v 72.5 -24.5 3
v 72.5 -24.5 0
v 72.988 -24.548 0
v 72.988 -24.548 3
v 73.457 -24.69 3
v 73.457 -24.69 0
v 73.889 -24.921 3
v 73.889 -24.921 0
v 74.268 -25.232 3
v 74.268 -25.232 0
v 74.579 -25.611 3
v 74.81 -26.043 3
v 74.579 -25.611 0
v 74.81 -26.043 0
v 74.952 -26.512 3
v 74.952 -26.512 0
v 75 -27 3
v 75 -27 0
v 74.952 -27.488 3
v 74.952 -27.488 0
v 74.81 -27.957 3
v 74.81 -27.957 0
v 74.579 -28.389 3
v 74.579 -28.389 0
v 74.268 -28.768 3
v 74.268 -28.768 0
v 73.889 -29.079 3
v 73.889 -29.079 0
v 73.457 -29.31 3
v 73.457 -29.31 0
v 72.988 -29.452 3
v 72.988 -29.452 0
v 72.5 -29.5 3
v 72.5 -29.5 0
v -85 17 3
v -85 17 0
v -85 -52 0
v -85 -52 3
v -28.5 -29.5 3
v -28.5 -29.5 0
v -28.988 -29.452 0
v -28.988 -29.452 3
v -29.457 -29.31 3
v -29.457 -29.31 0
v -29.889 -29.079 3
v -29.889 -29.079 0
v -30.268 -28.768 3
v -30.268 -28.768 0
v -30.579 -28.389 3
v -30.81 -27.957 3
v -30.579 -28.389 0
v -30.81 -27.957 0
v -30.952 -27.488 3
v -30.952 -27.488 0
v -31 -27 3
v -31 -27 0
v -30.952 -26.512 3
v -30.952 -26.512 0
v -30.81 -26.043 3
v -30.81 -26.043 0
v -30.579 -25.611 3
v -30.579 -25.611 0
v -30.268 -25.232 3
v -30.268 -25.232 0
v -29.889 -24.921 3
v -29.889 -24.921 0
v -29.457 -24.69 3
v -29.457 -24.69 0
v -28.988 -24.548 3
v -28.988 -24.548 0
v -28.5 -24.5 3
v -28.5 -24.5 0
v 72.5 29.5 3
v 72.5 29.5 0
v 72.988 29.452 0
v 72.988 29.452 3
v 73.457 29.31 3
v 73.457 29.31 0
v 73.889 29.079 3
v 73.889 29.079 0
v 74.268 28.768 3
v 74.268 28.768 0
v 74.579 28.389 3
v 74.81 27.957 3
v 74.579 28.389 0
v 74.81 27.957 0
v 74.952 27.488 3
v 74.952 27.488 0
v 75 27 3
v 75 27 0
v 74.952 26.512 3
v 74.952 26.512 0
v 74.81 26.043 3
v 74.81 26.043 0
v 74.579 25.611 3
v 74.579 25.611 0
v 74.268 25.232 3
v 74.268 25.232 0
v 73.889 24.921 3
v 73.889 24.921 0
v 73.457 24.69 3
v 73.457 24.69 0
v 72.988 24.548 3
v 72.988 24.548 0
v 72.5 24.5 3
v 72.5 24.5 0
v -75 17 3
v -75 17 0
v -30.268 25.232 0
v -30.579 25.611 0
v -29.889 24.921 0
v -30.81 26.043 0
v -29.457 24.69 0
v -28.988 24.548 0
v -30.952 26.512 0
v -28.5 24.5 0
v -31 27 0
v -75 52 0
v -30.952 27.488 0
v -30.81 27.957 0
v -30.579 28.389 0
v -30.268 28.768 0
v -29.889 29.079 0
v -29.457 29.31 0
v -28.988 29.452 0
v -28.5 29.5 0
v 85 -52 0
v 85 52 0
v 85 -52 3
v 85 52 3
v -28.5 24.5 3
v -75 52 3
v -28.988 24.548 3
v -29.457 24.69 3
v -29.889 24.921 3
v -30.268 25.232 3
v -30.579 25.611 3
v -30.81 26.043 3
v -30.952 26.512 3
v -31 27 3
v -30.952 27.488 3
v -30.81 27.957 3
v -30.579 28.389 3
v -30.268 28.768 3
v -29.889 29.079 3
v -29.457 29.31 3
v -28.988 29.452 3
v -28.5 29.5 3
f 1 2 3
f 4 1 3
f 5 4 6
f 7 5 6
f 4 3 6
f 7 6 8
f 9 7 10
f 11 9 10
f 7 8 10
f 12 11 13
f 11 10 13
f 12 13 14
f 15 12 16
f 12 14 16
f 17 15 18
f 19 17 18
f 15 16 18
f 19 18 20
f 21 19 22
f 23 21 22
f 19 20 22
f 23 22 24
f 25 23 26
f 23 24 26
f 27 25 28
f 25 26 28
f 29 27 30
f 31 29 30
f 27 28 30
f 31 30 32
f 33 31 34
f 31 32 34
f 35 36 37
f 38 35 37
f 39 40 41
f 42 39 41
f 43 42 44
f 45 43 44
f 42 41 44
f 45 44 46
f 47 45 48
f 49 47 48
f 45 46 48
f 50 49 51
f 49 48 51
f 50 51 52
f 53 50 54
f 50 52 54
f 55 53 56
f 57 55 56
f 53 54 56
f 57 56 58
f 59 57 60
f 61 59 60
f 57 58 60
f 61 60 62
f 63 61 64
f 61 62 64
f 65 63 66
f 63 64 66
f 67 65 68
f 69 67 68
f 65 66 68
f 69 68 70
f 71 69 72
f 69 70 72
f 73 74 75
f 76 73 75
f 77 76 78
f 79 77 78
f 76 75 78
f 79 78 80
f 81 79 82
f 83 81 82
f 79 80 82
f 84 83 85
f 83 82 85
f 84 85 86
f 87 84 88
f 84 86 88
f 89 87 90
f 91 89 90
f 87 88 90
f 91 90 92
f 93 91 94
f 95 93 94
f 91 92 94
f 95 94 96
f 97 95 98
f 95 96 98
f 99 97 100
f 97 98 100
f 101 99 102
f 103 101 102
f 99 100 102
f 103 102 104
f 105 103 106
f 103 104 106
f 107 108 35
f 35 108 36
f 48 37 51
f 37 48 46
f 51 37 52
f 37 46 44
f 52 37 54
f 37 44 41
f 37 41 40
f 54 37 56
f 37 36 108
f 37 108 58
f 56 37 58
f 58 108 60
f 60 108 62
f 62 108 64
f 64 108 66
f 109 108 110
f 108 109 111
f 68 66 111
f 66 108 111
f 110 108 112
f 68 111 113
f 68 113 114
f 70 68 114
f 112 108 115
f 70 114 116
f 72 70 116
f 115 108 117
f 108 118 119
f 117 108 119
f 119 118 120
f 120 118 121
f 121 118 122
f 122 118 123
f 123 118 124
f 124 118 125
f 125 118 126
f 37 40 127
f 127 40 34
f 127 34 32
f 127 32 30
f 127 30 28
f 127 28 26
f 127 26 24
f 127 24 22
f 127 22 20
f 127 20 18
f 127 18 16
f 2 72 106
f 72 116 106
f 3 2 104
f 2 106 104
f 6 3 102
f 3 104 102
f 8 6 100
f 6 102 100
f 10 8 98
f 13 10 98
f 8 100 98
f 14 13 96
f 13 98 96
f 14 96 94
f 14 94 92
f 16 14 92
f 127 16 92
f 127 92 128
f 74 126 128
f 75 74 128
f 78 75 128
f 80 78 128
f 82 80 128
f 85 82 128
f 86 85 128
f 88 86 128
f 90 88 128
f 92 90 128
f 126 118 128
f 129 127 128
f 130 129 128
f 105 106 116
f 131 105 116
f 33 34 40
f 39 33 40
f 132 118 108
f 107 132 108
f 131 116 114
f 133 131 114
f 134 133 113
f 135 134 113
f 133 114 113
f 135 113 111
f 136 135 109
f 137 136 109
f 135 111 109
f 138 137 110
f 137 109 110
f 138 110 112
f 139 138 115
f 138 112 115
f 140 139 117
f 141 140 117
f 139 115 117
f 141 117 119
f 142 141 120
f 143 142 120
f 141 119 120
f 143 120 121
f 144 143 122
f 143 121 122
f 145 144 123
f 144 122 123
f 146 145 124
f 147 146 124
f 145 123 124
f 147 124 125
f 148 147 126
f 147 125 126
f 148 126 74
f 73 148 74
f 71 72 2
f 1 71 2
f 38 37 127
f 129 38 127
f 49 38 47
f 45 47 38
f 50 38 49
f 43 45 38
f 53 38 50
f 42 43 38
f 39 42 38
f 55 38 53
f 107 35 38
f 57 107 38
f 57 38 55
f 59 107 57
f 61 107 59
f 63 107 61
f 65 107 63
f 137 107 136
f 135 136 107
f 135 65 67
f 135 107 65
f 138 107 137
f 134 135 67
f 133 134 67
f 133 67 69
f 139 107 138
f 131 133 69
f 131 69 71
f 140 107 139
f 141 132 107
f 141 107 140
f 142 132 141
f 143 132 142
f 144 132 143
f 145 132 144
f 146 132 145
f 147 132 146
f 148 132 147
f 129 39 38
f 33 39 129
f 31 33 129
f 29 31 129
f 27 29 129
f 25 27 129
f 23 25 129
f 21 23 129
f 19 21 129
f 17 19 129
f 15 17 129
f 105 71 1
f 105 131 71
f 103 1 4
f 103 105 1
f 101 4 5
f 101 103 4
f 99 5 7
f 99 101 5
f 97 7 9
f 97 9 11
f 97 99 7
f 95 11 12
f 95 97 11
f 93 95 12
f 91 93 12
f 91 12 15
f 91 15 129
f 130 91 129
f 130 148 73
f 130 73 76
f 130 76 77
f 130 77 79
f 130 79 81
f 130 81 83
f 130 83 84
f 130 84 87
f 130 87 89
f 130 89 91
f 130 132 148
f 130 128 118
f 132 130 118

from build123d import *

# Parameters (mm, degrees)
F1_DEPTH = 3


with BuildPart() as f1:
    # F0 (on Top) → F1 (new body)
    with BuildSketch(Plane.XY):
        Polygon((85, 52), (-75, 52), (-75, 17), (-85, 17), (-85, -52), (85, -52), align=None)
        with BuildLine():
            ThreePointArc((72.5, -24.5), (75, -27), (72.5, -29.5))
            Line((72.5, -29.5), (-28.5, -29.5))
            ThreePointArc((-28.5, -29.5), (-31, -27), (-28.5, -24.5))
            Line((-28.5, -24.5), (72.5, -24.5))
        make_face(mode=Mode.SUBTRACT)
        with BuildLine():
            Line((-28.5, 29.5), (72.5, 29.5))
            ThreePointArc((72.5, 29.5), (75, 27), (72.5, 24.5))
            Line((72.5, 24.5), (-28.5, 24.5))
            ThreePointArc((-28.5, 24.5), (-31, 27), (-28.5, 29.5))
        make_face(mode=Mode.SUBTRACT)
    extrude(amount=F1_DEPTH)


solid = f1.part
